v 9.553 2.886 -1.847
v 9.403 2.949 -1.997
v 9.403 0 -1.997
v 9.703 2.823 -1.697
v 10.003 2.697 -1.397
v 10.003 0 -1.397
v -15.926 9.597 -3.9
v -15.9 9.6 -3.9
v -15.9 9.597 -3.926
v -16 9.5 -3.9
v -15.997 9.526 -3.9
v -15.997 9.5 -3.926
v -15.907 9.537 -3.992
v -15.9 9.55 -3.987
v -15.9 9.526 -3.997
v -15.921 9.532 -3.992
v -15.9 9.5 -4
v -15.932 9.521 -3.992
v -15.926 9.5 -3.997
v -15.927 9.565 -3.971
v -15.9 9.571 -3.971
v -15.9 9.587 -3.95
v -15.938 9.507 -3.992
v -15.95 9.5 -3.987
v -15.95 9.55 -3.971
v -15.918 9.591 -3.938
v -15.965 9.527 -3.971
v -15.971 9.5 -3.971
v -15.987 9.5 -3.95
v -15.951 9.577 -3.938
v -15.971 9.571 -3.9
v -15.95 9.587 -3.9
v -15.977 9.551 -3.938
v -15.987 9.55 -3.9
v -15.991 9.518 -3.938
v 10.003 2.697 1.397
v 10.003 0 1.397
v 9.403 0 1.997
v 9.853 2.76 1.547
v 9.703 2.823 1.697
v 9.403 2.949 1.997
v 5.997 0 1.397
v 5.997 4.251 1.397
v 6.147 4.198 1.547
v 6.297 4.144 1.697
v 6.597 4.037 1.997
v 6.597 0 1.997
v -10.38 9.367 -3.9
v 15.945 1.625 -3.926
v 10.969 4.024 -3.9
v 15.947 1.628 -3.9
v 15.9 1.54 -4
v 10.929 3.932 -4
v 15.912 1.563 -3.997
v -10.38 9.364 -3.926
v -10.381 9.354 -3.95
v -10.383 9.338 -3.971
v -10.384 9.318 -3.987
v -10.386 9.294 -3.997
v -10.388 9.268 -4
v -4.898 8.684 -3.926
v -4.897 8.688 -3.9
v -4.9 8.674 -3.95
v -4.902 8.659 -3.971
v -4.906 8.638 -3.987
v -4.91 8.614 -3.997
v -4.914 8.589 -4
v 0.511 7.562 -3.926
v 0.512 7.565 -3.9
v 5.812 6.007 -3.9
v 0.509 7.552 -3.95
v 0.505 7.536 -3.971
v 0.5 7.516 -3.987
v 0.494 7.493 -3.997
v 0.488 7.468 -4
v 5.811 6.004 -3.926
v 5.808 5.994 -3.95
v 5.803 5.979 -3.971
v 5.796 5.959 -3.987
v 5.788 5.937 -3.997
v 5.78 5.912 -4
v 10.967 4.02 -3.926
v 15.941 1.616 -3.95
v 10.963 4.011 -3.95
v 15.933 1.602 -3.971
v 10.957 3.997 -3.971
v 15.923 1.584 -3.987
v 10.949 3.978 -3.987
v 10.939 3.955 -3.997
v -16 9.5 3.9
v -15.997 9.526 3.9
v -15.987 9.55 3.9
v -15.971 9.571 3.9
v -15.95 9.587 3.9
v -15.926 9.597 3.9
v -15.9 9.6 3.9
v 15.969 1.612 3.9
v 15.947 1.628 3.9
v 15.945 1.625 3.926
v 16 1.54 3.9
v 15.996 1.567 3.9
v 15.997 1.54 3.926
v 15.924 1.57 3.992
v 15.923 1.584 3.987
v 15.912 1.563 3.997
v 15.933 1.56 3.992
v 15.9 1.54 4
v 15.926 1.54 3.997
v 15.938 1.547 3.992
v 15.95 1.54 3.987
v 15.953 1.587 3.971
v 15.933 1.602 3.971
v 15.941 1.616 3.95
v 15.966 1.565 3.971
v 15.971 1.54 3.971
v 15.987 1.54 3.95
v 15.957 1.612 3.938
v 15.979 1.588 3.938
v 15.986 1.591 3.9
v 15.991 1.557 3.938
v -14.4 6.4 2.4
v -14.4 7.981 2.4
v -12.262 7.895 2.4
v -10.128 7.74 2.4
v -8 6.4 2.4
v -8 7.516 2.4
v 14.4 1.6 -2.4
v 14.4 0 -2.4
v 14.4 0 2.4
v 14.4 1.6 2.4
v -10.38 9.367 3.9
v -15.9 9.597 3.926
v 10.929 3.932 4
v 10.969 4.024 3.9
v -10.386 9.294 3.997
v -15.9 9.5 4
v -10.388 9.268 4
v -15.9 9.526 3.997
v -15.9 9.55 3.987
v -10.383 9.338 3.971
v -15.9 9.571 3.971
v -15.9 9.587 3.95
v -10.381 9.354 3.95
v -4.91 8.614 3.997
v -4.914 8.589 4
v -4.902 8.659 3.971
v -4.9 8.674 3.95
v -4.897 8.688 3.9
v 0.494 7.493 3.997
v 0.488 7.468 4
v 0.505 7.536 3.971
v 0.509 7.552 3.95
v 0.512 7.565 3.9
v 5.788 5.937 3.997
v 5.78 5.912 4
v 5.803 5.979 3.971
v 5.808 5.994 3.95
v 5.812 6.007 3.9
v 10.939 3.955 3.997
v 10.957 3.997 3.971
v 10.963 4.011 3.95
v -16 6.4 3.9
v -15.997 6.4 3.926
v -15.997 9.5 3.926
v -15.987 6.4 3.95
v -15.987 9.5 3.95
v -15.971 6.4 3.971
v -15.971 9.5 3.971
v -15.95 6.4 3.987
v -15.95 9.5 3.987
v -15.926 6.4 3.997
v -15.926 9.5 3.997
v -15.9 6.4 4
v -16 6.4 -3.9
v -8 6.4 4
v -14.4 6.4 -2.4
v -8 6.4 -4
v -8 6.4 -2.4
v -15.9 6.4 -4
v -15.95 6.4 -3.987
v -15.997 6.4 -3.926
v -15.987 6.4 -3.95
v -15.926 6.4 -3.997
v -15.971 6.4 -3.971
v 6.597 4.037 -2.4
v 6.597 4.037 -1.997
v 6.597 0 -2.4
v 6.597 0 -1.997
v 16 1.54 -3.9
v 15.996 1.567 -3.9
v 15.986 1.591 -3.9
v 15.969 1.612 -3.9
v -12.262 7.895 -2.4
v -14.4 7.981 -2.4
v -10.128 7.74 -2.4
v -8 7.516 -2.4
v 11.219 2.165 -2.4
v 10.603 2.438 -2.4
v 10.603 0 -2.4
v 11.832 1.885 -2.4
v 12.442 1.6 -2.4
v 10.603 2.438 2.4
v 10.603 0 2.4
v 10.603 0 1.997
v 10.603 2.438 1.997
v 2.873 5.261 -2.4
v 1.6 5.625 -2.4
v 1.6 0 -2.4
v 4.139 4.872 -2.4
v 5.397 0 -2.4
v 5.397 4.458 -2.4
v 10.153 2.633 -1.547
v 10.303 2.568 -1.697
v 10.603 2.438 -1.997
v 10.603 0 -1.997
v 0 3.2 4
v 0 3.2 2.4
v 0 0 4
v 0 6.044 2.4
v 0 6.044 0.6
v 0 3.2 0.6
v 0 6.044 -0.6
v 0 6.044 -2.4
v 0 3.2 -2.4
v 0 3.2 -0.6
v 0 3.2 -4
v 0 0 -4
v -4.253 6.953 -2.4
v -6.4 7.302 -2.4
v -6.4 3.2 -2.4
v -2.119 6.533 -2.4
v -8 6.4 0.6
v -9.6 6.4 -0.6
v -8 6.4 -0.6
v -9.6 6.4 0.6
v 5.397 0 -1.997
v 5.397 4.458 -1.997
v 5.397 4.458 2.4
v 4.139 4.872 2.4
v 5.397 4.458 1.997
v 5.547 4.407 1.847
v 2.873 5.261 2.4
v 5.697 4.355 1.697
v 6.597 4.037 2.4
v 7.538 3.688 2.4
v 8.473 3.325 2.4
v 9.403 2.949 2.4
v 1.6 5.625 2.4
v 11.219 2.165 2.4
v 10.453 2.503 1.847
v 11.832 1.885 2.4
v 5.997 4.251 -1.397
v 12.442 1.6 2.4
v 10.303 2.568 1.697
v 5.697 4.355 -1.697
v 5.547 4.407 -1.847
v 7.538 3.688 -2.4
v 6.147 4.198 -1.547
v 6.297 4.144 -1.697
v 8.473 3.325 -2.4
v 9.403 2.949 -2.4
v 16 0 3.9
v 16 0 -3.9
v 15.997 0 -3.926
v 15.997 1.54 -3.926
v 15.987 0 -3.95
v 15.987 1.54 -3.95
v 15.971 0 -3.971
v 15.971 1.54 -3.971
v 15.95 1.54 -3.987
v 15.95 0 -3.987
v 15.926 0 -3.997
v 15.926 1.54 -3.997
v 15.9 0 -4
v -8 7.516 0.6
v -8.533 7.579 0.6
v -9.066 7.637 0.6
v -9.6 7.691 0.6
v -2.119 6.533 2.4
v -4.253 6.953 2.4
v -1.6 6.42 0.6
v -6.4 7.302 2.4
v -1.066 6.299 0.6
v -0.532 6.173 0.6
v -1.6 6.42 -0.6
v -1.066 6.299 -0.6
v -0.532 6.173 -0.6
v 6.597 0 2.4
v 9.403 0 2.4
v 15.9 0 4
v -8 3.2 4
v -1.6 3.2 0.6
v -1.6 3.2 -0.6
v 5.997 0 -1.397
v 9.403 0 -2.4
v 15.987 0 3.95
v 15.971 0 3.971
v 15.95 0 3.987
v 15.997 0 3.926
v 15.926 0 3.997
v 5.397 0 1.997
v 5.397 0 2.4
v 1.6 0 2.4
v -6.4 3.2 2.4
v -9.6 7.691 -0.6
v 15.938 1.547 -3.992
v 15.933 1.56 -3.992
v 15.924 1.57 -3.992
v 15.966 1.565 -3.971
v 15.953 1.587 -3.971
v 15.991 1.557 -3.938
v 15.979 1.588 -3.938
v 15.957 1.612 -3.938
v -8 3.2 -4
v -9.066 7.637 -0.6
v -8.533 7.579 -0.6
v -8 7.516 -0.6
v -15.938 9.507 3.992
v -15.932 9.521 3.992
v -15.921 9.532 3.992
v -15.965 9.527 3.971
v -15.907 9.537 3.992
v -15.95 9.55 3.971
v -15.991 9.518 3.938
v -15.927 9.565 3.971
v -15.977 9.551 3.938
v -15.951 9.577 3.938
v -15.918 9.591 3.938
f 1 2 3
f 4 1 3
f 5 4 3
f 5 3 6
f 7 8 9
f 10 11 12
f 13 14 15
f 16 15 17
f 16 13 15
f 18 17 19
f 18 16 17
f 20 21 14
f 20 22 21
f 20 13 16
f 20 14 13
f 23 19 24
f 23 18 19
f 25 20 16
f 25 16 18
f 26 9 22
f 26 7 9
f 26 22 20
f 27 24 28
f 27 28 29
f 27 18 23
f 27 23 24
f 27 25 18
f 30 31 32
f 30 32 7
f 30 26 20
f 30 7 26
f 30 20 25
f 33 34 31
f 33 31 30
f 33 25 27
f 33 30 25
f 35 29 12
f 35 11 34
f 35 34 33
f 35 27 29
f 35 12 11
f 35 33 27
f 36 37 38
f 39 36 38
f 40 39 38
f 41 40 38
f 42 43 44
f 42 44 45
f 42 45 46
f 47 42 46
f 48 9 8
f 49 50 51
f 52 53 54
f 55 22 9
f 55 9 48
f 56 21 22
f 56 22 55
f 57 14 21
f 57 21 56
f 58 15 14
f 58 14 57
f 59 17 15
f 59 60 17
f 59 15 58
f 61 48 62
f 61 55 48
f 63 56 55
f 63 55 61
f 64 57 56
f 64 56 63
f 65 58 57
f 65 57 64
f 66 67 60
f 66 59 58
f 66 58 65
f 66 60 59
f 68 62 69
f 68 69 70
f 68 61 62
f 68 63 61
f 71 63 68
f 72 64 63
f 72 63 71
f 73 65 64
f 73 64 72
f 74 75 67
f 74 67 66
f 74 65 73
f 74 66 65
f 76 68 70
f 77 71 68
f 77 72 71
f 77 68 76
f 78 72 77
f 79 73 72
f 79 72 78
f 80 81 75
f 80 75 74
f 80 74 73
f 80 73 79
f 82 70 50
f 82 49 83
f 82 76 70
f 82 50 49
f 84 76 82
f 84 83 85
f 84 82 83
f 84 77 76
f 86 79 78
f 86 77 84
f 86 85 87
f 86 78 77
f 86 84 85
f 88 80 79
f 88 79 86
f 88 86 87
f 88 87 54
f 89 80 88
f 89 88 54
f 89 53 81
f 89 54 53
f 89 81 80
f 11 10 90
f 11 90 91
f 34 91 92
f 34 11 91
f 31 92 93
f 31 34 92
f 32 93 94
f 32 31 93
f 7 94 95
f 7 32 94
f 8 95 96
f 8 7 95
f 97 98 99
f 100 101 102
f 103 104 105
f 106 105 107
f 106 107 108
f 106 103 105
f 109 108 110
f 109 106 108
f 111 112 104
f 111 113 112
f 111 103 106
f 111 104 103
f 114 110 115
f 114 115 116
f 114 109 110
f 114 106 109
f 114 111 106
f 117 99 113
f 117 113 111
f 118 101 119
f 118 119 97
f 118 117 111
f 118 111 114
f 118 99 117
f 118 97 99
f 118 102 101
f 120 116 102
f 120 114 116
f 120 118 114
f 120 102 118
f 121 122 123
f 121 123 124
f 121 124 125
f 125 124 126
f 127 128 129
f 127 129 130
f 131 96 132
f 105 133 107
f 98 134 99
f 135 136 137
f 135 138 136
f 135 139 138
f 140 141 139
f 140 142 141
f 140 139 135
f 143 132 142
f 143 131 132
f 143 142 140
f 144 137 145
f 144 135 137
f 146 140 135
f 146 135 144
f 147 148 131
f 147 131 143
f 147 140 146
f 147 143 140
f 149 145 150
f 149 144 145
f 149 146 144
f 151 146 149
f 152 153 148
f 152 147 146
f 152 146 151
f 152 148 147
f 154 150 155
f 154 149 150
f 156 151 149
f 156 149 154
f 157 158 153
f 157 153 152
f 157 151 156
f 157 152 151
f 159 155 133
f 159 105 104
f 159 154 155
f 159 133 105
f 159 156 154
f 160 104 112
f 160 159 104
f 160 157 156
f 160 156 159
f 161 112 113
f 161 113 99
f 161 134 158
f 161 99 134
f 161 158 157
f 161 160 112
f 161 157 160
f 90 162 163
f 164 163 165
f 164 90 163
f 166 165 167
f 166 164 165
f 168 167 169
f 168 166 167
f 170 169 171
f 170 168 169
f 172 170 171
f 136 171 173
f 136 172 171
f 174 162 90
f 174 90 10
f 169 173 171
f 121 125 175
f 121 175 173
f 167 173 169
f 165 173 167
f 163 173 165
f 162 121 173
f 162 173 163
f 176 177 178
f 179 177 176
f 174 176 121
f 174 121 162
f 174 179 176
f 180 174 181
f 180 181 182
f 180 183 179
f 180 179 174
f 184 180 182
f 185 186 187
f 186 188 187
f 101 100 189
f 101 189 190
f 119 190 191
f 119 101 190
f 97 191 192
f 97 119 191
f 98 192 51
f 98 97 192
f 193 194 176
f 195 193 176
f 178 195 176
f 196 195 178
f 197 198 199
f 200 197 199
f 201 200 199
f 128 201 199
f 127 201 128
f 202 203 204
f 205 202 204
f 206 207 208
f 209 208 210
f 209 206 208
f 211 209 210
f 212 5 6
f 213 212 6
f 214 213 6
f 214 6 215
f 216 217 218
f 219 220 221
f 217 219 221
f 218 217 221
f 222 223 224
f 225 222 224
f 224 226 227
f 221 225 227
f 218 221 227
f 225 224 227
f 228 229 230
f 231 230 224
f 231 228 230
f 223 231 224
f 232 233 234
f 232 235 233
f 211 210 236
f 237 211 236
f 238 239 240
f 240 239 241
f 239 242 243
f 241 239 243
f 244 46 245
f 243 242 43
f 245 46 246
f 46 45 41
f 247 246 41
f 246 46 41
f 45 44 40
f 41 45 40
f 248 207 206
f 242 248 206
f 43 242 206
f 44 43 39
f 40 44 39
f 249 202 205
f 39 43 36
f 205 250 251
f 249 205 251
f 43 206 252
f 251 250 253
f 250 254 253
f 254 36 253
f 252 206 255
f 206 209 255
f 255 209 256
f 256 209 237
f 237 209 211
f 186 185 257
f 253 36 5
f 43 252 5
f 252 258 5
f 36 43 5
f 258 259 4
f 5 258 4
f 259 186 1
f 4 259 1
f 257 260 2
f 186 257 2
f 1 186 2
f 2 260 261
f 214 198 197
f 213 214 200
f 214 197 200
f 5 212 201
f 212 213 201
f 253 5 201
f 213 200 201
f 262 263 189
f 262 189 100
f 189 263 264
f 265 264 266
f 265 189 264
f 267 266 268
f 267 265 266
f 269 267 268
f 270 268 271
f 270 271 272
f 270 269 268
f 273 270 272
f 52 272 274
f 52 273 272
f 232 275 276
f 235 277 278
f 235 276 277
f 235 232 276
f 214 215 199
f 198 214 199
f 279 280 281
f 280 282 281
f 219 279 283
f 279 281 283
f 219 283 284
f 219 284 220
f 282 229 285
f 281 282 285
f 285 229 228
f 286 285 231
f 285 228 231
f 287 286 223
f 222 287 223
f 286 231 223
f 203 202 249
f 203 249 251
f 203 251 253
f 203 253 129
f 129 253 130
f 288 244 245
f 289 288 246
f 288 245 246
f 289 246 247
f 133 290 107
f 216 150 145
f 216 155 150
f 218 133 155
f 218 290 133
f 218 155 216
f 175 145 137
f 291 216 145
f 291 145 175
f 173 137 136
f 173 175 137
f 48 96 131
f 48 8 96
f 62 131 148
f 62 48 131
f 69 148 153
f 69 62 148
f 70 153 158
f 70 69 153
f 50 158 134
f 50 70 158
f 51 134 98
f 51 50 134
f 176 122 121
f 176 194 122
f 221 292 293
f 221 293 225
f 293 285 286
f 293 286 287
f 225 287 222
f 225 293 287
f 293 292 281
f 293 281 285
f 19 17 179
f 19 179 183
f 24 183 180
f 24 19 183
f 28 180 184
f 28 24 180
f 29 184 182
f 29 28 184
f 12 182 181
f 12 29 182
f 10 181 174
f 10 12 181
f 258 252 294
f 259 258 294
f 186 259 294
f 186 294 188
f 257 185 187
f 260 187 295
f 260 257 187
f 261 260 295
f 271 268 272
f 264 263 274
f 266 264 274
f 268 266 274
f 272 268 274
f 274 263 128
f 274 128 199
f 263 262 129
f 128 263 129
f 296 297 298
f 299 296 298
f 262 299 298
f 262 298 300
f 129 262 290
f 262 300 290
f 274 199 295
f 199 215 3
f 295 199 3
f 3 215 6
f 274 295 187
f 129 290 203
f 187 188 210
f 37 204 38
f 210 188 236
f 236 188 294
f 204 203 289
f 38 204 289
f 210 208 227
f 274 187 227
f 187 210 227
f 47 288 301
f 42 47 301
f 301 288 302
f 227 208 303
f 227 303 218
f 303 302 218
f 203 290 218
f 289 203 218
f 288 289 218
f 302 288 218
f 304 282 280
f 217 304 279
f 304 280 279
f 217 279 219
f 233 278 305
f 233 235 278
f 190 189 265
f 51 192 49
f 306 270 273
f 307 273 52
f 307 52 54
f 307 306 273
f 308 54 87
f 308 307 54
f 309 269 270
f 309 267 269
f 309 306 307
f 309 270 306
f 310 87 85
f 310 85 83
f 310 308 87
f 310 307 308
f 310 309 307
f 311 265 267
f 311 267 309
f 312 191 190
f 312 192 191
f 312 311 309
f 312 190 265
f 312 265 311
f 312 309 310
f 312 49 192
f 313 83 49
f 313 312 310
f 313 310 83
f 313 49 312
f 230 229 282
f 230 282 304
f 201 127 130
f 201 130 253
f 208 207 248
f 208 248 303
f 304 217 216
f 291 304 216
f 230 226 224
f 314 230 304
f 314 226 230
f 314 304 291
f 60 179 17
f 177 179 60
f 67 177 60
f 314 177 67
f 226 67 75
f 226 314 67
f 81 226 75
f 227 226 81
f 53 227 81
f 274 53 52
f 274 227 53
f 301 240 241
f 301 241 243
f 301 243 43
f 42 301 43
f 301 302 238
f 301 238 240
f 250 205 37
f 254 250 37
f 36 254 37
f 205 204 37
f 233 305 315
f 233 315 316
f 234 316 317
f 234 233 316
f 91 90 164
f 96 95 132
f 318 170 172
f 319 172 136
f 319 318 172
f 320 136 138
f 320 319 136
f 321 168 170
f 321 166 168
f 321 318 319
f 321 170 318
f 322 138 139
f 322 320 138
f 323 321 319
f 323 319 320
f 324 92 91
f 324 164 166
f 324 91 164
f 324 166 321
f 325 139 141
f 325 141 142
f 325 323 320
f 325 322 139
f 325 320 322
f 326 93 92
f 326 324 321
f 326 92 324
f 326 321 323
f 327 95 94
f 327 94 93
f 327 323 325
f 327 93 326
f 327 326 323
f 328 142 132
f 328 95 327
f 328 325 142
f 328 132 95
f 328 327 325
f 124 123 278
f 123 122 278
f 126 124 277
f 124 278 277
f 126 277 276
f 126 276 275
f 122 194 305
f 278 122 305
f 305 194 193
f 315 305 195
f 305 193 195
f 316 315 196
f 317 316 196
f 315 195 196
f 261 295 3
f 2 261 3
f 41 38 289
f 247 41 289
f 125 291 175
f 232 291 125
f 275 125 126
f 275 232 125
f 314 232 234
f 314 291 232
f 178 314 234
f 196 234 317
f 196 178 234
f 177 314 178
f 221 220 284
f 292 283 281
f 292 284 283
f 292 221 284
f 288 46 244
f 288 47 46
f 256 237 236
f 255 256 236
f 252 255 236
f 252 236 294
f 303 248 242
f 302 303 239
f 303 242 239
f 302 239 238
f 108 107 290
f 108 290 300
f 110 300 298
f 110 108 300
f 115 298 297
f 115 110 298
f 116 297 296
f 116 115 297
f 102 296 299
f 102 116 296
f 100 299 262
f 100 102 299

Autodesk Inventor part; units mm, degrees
ref_plane "YZ Plane" through (0, 0, 0) normal (1, 0, 0) x (0, 1, 0)
ref_plane "XZ Plane" through (0, 0, 0) normal (0, 1, 0) x (-1, 0, 0)
ref_plane "XY Plane" through (0, 0, 0) normal (0, 0, 1) x (1, 0, 0)
sketch "Sketch2" plane through (0, 0, 0) normal (0, 1, 0) x (-1, 0, 0)
  line L0 (-16, 4) -> (16, 4)
  line L1 (16, 4) -> (16, -4)
  line L2 (16, -4) -> (-16, -4)
  line L3 (-16, -4) -> (-16, 4)
  point P0 (0, 0)
  point P1 (0, 4)
  point P2 (-16, 0)
  dimension "d0" = 32
  dimension "d1" = 8
extrude "Extrusion1" add sketch "Sketch2" along normal blind 9.6
sketch "Sketch10" plane through (0, 0, 0) normal (0, 0, 1) x (1, 0, 0)
  line L0 (-16, 9.6) -> (16, 9.6) projected
  line L1 (-16, 0) -> (-16, 9.6) projected
  arc A0 (16, 1.6) -> (-16, 9.6) centre (-16, -58.4) ccw
  line L2 (16, 1.6) -> (16, 9.6)
  line L3 (-16, 0) -> (16, 0) projected
  line L4 (14.4, 0) -> (14.4, 1.6)
  line L5 (14.4, 1.6) -> (12.4422, 1.6)
  line L6 (-8, 3.2) -> (-8, 7.5163)
  line L7 (-6.4, 7.3024) -> (-6.4, 3.2)
  arc A1 (12.4422, 1.6) -> (-6.4, 7.3024) centre (-16, -58.4) ccw
  arc A2 (-8, 7.5163) -> (-14.4, 7.9807) centre (-16, -58.4) ccw
  line L8 (-14.4, 7.9807) -> (-14.4, 6.4)
  line L9 (1.6, 5.625) -> (1.6, 0)
  line L10 (0, 6.0435) -> (0, 0)
  line L11 (0, 3.2) -> (-6.4, 3.2)
  line L12 (-8, 6.4) -> (-14.4, 6.4)
  line L13 (-14.4, 6.4) -> (-16, 6.4)
  line L14 (16, 0) -> (16, 9.6) projected
  line L15 (1.6, 0) -> (14.4, 0)
  line L16 (0, 0) -> (-16, 0)
  line L17 (-16, 0) -> (-16, 6.4)
  line L18 (-6.4, 3.2) -> (-8, 3.2)
  dimension "d100" = 1.6
  dimension "d104" = 1.6
  dimension "d105" = 1.6
  dimension "d107" = 1.6
  dimension "d108" = 1.6
  dimension "d113" = 6.4
  dimension "d114" = 3.2
  dimension "d115" = 16
  dimension "d116" = 1.6
extrude "Extrusion7" cut sketch "Sketch10" along normal through all both and the other way through all contours L0 L2 A0 | L13 L12 L6 L18 L11 L10 L3 L1
extrude "Extrusion8" cut sketch "Sketch10" along normal mid plane 4.8 contours L8 A2 L6 L12 | L3 L9 A1 L5 L4 | L11 L7 A1 L10
sketch "Sketch3" plane through (0, 0, 0) normal (0, -1, 0) x (1, 0, 0)
  circle A0 centre (12, 0) radius 2.4 construction
  line L0 (14.4, -2.4) -> (1.6, -2.4) projected
  line L1 (1.6, -2.4) -> (1.6, 2.4) projected
  line L2 (1.6, 2.4) -> (14.4, 2.4) projected
  line L3 (14.4, 2.4) -> (14.4, -2.4) projected
  line L4 (16, 4) -> (0, 4) projected
  circle A1 centre (4, 0) radius 2.4 construction
  line L5 (5.3971, 2.4) -> (5.3971, 1.9971)
  line L6 (5.3971, 1.9971) -> (5.9971, 1.3971)
  line L7 (5.9971, 1.3971) -> (6.5971, 1.9971)
  line L8 (6.5971, 1.9971) -> (6.5971, 2.4)
  line L9 (10.6029, 2.4) -> (10.6029, 1.9971)
  line L10 (10.6029, 1.9971) -> (10.0029, 1.3971)
  line L11 (10.0029, 1.3971) -> (9.4029, 1.9971)
  line L12 (9.4029, 1.9971) -> (9.4029, 2.4)
  line L13 (5.3971, -2.4) -> (5.3971, -1.9971)
  line L14 (5.3971, -1.9971) -> (5.9971, -1.3971)
  line L15 (5.9971, -1.3971) -> (6.5971, -1.9971)
  line L16 (6.5971, -1.9971) -> (6.5971, -2.4)
  line L17 (9.4029, -2.4) -> (9.4029, -1.9971)
  line L18 (9.4029, -1.9971) -> (10.0029, -1.3971)
  line L19 (10.0029, -1.3971) -> (10.6029, -1.9971)
  line L20 (10.6029, -1.9971) -> (10.6029, -2.4)
  line L21 (5.6971, 1.6971) -> (4, 0) construction
  dimension "d97" = 4.8
  dimension "d118" = 1.2
extrude "Extrusion2" add sketch "Sketch3" against normal up to next contours L0 L17 L18 L19 L20 | L9 L10 L11 L12 L2 | L0 L13 L14 L15 L16 | L8 L7 L6 L5 L2
sketch "Sketch11" plane through (-8, 3.2, 4) normal (0, -1, 0) x (1, 0, 0)
  line L0 (1.6, -1.6) -> (8, -1.6) projected
  line L1 (8, -1.6) -> (8, 0) projected
  line L2 (8, -6.4) -> (1.6, -6.4) projected
  line L3 (1.6, -6.4) -> (1.6, -1.6) projected
  circle A0 centre (4, -4) radius 2.4 construction
  line L4 (8, -3.4) -> (6.4, -3.4)
  line L5 (6.4, -3.4) -> (6.4, -4.6)
  line L6 (6.4, -4.6) -> (8, -4.6)
  line L7 (8, -3.4) -> (8, -4.6)
  point P0 (8, -4)
  point P1 (6.4, -4)
  dimension "d119" = 1.2
extrude "Extrusion9" add sketch "Sketch11" against normal up to next
sketch "Sketch12" plane through (-16, 6.4, 4) normal (0, -1, 0) x (1, 0, 0)
  line L0 (1.6, -1.6) -> (8, -1.6) projected
  line L1 (8, -6.4) -> (1.6, -6.4) projected
  line L2 (1.6, -6.4) -> (1.6, -1.6) projected
  line L3 (8, -3.4) -> (6.4, -3.4)
  line L4 (6.4, -3.4) -> (6.4, -4.6)
  line L5 (6.4, -4.6) -> (8, -4.6)
  line L6 (8, -4.6) -> (8, -3.4)
  circle A0 centre (4, -4) radius 2.4 construction
  point P0 (16, -4)
  point P1 (6.4, -4)
  dimension "d122" = 1.2
extrude "Extrusion10" add sketch "Sketch12" against normal up to next
fillet "Fillet1" radius 0.1 8 edges at (-16, 8, 4) (-16, 9.6, 0) (16, 0.8, 4) (16, 0.8, -4) (-16, 8, -4) (0.4924, 7.5697, 4) (0.4924, 7.5697, -4) (16, 1.6, 0)
equation "\"d4\" = lh"
equation "\"d100\" = wall"
equation "\"d104\" = wall"
equation "\"d105\" = 0.333333 * lh - topthk"
equation "\"d107\" = topthk"
equation "\"d108\" = d104"
equation "\"d113\" = 0.666667 * lh"
equation "\"d114\" = 0.333333 * lh"
equation "\"d115\" = 2 * lu"
equation "\"d116\" = wall"
equation "\"d109\" = lu - 2 * wall"
equation "\"d97\" = kd"
equation "\"d22\" = lf"
equation "\"d103\" = d102"
equation "\"lh\" = 9.6"
equation "\"wall\" = 1.6"
equation "\"topthk\" = 1.6"
equation "\"lu\" = 8"
equation "\"kd\" = 4.8"
equation "\"lf\" = 0.1"
equation "\"d102\" = 1.6"
properties part number "11153-Black" material "ABS Plastic"
